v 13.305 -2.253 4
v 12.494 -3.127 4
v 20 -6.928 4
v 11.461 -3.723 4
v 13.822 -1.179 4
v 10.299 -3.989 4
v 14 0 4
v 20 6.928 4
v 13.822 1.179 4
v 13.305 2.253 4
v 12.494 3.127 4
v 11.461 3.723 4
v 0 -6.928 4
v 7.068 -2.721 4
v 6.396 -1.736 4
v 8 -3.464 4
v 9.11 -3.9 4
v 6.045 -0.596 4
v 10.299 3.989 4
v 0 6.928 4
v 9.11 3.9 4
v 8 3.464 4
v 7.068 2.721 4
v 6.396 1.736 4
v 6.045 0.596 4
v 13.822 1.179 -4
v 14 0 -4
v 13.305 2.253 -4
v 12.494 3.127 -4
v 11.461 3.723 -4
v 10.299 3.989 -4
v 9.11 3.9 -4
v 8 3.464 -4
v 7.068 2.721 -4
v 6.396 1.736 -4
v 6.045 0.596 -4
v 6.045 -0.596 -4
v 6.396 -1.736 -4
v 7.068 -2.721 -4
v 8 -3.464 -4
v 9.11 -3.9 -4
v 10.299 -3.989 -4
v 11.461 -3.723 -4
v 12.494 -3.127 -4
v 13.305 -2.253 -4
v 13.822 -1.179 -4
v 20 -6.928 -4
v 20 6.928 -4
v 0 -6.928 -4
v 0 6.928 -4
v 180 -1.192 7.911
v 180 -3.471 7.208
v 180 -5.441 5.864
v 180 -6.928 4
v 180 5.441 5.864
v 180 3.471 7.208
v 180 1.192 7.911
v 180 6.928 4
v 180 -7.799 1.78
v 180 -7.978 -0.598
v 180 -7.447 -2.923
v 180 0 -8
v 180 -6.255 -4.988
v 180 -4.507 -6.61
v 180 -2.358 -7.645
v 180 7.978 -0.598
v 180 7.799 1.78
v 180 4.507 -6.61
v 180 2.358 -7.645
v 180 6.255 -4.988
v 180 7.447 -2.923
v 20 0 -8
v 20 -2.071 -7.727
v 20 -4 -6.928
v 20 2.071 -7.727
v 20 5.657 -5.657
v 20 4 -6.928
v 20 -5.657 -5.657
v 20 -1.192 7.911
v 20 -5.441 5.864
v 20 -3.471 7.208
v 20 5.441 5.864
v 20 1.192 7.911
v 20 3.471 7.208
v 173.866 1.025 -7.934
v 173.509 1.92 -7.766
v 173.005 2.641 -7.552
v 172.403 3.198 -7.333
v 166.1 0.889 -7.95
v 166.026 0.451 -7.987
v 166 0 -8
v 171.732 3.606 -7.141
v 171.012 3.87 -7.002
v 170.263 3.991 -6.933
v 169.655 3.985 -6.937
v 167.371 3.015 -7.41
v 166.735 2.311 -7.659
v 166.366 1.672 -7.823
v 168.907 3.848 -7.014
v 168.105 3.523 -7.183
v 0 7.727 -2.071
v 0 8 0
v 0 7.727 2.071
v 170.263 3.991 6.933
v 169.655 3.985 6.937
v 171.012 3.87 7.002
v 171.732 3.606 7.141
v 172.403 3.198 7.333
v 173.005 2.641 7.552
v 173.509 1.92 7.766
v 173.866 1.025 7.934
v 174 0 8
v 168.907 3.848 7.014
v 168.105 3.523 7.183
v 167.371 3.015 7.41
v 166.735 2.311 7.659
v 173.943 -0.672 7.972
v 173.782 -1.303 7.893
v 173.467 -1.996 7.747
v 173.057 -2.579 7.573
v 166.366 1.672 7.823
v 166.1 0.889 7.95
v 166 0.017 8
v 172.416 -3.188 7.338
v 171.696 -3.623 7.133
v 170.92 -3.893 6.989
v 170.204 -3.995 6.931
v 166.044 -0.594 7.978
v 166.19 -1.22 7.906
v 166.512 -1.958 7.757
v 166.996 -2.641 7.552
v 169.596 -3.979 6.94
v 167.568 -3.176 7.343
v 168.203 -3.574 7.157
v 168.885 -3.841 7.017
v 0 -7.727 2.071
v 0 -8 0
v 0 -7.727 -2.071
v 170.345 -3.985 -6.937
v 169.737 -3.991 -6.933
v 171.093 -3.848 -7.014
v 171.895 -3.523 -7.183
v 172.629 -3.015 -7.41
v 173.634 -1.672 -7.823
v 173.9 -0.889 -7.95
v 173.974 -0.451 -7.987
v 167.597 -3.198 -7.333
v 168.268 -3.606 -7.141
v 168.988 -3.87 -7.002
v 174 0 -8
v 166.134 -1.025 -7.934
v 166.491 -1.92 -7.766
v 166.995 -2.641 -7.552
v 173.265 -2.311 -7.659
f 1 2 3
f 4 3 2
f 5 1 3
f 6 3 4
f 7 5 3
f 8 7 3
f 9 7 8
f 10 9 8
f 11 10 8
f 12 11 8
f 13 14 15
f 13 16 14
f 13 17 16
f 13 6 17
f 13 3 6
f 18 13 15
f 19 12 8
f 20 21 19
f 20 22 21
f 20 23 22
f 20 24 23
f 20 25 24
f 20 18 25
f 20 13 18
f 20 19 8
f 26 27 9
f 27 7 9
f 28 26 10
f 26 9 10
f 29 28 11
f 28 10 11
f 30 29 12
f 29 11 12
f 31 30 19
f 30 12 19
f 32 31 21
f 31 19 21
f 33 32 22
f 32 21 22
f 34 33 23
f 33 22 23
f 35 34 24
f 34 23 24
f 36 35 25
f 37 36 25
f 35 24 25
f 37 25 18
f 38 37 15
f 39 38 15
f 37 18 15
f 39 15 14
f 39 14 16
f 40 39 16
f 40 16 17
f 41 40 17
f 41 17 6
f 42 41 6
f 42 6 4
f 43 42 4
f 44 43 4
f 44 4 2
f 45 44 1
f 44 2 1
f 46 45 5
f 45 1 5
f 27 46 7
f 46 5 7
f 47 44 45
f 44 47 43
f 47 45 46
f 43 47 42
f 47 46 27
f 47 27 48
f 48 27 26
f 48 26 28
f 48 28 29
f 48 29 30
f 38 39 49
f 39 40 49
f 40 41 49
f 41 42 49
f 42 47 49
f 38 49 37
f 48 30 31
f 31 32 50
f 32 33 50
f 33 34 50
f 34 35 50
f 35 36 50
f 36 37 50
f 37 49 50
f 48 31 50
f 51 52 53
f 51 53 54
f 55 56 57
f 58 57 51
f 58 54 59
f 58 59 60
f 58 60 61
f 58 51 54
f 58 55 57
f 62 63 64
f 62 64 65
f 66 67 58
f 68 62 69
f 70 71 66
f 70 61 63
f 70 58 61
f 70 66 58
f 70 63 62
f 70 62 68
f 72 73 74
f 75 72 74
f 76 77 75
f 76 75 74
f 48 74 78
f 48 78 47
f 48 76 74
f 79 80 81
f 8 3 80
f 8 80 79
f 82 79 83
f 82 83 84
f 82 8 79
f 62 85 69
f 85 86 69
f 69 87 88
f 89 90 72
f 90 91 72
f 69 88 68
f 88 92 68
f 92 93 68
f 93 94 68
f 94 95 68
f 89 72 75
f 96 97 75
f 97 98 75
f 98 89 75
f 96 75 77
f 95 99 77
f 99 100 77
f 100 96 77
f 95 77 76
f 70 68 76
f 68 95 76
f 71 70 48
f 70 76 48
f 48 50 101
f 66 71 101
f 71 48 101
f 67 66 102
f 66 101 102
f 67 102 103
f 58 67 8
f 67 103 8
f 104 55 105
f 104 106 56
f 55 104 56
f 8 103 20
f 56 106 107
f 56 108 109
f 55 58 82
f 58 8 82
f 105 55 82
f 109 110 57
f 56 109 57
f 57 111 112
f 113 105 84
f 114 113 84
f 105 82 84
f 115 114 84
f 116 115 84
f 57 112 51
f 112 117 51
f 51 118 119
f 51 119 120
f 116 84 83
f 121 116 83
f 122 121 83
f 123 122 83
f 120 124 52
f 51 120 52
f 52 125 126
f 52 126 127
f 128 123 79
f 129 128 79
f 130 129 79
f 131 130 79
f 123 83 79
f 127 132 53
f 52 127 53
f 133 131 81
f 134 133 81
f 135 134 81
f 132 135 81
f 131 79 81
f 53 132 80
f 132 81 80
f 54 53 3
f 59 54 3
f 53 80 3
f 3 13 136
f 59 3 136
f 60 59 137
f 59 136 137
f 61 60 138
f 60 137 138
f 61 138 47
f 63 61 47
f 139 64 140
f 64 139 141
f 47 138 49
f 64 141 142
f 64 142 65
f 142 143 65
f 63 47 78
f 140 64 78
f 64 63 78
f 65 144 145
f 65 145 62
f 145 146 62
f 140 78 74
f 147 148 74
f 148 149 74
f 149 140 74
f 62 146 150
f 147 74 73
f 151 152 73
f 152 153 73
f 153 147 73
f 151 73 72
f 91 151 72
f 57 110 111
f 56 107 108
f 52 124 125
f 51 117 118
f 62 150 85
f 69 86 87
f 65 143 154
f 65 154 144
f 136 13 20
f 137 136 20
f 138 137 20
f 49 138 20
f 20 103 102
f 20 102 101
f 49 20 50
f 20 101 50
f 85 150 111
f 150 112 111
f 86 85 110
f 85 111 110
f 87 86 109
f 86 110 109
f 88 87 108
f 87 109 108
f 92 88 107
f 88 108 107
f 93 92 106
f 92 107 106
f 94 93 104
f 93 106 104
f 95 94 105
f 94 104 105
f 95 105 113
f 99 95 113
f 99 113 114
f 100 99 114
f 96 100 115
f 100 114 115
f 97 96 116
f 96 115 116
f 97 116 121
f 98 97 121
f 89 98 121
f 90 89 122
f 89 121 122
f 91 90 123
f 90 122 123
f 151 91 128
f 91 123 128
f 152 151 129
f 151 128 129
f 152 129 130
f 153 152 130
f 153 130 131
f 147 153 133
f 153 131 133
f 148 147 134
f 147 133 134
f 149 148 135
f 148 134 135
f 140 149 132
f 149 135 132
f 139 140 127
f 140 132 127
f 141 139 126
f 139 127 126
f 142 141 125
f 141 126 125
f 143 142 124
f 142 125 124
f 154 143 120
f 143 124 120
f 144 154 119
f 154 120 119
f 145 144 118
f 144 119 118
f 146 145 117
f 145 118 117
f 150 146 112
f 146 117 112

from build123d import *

# Parameters (mm, degrees)
SKETCH_1_R               = 8
EXTRUDE_1_DEPTH          = 180
SKETCH_2_R               = 4
CUT_EXTRUDE_1_DEPTH      = 9
CUT_EXTRUDE_1_DEPTH_BACK = 9
SKETCH_3_OUTSIDE_W       = 54.284
SKETCH_3_OUTSIDE_H       = 54.284
SKETCH_3_OUTSIDE_W_2     = 8
SKETCH_3_OUTSIDE_H_2     = 20
CUT_EXTRUDE_2_DEPTH      = 20


with BuildPart() as part:
    # 草图1 → 凸台-拉伸1 (new body)
    with BuildSketch(Plane(origin=(0, 0, 0), x_dir=(0, 0, -1), z_dir=(1, 0, 0))):
        Circle(SKETCH_1_R)
    extrude(amount=EXTRUDE_1_DEPTH)

    # 草图2 → 切除-拉伸1 (cut, two sides)
    with BuildSketch(Plane.XY) as cut_extrude_1_sk:
        with Locations((10, 0)):
            Circle(SKETCH_2_R)
        with Locations((170, 0)):
            Circle(SKETCH_2_R)
    extrude(amount=CUT_EXTRUDE_1_DEPTH, mode=Mode.SUBTRACT)
    extrude(cut_extrude_1_sk.sketch, amount=-CUT_EXTRUDE_1_DEPTH_BACK, mode=Mode.SUBTRACT)

    # 草图3 outside → 切除-拉伸2 (cut)
    with BuildSketch(Plane.ZY):
        Rectangle(SKETCH_3_OUTSIDE_W, SKETCH_3_OUTSIDE_H)
        Rectangle(SKETCH_3_OUTSIDE_W_2, SKETCH_3_OUTSIDE_H_2, mode=Mode.SUBTRACT)
    extrude(amount=-CUT_EXTRUDE_2_DEPTH, mode=Mode.SUBTRACT)


solid = part.part
